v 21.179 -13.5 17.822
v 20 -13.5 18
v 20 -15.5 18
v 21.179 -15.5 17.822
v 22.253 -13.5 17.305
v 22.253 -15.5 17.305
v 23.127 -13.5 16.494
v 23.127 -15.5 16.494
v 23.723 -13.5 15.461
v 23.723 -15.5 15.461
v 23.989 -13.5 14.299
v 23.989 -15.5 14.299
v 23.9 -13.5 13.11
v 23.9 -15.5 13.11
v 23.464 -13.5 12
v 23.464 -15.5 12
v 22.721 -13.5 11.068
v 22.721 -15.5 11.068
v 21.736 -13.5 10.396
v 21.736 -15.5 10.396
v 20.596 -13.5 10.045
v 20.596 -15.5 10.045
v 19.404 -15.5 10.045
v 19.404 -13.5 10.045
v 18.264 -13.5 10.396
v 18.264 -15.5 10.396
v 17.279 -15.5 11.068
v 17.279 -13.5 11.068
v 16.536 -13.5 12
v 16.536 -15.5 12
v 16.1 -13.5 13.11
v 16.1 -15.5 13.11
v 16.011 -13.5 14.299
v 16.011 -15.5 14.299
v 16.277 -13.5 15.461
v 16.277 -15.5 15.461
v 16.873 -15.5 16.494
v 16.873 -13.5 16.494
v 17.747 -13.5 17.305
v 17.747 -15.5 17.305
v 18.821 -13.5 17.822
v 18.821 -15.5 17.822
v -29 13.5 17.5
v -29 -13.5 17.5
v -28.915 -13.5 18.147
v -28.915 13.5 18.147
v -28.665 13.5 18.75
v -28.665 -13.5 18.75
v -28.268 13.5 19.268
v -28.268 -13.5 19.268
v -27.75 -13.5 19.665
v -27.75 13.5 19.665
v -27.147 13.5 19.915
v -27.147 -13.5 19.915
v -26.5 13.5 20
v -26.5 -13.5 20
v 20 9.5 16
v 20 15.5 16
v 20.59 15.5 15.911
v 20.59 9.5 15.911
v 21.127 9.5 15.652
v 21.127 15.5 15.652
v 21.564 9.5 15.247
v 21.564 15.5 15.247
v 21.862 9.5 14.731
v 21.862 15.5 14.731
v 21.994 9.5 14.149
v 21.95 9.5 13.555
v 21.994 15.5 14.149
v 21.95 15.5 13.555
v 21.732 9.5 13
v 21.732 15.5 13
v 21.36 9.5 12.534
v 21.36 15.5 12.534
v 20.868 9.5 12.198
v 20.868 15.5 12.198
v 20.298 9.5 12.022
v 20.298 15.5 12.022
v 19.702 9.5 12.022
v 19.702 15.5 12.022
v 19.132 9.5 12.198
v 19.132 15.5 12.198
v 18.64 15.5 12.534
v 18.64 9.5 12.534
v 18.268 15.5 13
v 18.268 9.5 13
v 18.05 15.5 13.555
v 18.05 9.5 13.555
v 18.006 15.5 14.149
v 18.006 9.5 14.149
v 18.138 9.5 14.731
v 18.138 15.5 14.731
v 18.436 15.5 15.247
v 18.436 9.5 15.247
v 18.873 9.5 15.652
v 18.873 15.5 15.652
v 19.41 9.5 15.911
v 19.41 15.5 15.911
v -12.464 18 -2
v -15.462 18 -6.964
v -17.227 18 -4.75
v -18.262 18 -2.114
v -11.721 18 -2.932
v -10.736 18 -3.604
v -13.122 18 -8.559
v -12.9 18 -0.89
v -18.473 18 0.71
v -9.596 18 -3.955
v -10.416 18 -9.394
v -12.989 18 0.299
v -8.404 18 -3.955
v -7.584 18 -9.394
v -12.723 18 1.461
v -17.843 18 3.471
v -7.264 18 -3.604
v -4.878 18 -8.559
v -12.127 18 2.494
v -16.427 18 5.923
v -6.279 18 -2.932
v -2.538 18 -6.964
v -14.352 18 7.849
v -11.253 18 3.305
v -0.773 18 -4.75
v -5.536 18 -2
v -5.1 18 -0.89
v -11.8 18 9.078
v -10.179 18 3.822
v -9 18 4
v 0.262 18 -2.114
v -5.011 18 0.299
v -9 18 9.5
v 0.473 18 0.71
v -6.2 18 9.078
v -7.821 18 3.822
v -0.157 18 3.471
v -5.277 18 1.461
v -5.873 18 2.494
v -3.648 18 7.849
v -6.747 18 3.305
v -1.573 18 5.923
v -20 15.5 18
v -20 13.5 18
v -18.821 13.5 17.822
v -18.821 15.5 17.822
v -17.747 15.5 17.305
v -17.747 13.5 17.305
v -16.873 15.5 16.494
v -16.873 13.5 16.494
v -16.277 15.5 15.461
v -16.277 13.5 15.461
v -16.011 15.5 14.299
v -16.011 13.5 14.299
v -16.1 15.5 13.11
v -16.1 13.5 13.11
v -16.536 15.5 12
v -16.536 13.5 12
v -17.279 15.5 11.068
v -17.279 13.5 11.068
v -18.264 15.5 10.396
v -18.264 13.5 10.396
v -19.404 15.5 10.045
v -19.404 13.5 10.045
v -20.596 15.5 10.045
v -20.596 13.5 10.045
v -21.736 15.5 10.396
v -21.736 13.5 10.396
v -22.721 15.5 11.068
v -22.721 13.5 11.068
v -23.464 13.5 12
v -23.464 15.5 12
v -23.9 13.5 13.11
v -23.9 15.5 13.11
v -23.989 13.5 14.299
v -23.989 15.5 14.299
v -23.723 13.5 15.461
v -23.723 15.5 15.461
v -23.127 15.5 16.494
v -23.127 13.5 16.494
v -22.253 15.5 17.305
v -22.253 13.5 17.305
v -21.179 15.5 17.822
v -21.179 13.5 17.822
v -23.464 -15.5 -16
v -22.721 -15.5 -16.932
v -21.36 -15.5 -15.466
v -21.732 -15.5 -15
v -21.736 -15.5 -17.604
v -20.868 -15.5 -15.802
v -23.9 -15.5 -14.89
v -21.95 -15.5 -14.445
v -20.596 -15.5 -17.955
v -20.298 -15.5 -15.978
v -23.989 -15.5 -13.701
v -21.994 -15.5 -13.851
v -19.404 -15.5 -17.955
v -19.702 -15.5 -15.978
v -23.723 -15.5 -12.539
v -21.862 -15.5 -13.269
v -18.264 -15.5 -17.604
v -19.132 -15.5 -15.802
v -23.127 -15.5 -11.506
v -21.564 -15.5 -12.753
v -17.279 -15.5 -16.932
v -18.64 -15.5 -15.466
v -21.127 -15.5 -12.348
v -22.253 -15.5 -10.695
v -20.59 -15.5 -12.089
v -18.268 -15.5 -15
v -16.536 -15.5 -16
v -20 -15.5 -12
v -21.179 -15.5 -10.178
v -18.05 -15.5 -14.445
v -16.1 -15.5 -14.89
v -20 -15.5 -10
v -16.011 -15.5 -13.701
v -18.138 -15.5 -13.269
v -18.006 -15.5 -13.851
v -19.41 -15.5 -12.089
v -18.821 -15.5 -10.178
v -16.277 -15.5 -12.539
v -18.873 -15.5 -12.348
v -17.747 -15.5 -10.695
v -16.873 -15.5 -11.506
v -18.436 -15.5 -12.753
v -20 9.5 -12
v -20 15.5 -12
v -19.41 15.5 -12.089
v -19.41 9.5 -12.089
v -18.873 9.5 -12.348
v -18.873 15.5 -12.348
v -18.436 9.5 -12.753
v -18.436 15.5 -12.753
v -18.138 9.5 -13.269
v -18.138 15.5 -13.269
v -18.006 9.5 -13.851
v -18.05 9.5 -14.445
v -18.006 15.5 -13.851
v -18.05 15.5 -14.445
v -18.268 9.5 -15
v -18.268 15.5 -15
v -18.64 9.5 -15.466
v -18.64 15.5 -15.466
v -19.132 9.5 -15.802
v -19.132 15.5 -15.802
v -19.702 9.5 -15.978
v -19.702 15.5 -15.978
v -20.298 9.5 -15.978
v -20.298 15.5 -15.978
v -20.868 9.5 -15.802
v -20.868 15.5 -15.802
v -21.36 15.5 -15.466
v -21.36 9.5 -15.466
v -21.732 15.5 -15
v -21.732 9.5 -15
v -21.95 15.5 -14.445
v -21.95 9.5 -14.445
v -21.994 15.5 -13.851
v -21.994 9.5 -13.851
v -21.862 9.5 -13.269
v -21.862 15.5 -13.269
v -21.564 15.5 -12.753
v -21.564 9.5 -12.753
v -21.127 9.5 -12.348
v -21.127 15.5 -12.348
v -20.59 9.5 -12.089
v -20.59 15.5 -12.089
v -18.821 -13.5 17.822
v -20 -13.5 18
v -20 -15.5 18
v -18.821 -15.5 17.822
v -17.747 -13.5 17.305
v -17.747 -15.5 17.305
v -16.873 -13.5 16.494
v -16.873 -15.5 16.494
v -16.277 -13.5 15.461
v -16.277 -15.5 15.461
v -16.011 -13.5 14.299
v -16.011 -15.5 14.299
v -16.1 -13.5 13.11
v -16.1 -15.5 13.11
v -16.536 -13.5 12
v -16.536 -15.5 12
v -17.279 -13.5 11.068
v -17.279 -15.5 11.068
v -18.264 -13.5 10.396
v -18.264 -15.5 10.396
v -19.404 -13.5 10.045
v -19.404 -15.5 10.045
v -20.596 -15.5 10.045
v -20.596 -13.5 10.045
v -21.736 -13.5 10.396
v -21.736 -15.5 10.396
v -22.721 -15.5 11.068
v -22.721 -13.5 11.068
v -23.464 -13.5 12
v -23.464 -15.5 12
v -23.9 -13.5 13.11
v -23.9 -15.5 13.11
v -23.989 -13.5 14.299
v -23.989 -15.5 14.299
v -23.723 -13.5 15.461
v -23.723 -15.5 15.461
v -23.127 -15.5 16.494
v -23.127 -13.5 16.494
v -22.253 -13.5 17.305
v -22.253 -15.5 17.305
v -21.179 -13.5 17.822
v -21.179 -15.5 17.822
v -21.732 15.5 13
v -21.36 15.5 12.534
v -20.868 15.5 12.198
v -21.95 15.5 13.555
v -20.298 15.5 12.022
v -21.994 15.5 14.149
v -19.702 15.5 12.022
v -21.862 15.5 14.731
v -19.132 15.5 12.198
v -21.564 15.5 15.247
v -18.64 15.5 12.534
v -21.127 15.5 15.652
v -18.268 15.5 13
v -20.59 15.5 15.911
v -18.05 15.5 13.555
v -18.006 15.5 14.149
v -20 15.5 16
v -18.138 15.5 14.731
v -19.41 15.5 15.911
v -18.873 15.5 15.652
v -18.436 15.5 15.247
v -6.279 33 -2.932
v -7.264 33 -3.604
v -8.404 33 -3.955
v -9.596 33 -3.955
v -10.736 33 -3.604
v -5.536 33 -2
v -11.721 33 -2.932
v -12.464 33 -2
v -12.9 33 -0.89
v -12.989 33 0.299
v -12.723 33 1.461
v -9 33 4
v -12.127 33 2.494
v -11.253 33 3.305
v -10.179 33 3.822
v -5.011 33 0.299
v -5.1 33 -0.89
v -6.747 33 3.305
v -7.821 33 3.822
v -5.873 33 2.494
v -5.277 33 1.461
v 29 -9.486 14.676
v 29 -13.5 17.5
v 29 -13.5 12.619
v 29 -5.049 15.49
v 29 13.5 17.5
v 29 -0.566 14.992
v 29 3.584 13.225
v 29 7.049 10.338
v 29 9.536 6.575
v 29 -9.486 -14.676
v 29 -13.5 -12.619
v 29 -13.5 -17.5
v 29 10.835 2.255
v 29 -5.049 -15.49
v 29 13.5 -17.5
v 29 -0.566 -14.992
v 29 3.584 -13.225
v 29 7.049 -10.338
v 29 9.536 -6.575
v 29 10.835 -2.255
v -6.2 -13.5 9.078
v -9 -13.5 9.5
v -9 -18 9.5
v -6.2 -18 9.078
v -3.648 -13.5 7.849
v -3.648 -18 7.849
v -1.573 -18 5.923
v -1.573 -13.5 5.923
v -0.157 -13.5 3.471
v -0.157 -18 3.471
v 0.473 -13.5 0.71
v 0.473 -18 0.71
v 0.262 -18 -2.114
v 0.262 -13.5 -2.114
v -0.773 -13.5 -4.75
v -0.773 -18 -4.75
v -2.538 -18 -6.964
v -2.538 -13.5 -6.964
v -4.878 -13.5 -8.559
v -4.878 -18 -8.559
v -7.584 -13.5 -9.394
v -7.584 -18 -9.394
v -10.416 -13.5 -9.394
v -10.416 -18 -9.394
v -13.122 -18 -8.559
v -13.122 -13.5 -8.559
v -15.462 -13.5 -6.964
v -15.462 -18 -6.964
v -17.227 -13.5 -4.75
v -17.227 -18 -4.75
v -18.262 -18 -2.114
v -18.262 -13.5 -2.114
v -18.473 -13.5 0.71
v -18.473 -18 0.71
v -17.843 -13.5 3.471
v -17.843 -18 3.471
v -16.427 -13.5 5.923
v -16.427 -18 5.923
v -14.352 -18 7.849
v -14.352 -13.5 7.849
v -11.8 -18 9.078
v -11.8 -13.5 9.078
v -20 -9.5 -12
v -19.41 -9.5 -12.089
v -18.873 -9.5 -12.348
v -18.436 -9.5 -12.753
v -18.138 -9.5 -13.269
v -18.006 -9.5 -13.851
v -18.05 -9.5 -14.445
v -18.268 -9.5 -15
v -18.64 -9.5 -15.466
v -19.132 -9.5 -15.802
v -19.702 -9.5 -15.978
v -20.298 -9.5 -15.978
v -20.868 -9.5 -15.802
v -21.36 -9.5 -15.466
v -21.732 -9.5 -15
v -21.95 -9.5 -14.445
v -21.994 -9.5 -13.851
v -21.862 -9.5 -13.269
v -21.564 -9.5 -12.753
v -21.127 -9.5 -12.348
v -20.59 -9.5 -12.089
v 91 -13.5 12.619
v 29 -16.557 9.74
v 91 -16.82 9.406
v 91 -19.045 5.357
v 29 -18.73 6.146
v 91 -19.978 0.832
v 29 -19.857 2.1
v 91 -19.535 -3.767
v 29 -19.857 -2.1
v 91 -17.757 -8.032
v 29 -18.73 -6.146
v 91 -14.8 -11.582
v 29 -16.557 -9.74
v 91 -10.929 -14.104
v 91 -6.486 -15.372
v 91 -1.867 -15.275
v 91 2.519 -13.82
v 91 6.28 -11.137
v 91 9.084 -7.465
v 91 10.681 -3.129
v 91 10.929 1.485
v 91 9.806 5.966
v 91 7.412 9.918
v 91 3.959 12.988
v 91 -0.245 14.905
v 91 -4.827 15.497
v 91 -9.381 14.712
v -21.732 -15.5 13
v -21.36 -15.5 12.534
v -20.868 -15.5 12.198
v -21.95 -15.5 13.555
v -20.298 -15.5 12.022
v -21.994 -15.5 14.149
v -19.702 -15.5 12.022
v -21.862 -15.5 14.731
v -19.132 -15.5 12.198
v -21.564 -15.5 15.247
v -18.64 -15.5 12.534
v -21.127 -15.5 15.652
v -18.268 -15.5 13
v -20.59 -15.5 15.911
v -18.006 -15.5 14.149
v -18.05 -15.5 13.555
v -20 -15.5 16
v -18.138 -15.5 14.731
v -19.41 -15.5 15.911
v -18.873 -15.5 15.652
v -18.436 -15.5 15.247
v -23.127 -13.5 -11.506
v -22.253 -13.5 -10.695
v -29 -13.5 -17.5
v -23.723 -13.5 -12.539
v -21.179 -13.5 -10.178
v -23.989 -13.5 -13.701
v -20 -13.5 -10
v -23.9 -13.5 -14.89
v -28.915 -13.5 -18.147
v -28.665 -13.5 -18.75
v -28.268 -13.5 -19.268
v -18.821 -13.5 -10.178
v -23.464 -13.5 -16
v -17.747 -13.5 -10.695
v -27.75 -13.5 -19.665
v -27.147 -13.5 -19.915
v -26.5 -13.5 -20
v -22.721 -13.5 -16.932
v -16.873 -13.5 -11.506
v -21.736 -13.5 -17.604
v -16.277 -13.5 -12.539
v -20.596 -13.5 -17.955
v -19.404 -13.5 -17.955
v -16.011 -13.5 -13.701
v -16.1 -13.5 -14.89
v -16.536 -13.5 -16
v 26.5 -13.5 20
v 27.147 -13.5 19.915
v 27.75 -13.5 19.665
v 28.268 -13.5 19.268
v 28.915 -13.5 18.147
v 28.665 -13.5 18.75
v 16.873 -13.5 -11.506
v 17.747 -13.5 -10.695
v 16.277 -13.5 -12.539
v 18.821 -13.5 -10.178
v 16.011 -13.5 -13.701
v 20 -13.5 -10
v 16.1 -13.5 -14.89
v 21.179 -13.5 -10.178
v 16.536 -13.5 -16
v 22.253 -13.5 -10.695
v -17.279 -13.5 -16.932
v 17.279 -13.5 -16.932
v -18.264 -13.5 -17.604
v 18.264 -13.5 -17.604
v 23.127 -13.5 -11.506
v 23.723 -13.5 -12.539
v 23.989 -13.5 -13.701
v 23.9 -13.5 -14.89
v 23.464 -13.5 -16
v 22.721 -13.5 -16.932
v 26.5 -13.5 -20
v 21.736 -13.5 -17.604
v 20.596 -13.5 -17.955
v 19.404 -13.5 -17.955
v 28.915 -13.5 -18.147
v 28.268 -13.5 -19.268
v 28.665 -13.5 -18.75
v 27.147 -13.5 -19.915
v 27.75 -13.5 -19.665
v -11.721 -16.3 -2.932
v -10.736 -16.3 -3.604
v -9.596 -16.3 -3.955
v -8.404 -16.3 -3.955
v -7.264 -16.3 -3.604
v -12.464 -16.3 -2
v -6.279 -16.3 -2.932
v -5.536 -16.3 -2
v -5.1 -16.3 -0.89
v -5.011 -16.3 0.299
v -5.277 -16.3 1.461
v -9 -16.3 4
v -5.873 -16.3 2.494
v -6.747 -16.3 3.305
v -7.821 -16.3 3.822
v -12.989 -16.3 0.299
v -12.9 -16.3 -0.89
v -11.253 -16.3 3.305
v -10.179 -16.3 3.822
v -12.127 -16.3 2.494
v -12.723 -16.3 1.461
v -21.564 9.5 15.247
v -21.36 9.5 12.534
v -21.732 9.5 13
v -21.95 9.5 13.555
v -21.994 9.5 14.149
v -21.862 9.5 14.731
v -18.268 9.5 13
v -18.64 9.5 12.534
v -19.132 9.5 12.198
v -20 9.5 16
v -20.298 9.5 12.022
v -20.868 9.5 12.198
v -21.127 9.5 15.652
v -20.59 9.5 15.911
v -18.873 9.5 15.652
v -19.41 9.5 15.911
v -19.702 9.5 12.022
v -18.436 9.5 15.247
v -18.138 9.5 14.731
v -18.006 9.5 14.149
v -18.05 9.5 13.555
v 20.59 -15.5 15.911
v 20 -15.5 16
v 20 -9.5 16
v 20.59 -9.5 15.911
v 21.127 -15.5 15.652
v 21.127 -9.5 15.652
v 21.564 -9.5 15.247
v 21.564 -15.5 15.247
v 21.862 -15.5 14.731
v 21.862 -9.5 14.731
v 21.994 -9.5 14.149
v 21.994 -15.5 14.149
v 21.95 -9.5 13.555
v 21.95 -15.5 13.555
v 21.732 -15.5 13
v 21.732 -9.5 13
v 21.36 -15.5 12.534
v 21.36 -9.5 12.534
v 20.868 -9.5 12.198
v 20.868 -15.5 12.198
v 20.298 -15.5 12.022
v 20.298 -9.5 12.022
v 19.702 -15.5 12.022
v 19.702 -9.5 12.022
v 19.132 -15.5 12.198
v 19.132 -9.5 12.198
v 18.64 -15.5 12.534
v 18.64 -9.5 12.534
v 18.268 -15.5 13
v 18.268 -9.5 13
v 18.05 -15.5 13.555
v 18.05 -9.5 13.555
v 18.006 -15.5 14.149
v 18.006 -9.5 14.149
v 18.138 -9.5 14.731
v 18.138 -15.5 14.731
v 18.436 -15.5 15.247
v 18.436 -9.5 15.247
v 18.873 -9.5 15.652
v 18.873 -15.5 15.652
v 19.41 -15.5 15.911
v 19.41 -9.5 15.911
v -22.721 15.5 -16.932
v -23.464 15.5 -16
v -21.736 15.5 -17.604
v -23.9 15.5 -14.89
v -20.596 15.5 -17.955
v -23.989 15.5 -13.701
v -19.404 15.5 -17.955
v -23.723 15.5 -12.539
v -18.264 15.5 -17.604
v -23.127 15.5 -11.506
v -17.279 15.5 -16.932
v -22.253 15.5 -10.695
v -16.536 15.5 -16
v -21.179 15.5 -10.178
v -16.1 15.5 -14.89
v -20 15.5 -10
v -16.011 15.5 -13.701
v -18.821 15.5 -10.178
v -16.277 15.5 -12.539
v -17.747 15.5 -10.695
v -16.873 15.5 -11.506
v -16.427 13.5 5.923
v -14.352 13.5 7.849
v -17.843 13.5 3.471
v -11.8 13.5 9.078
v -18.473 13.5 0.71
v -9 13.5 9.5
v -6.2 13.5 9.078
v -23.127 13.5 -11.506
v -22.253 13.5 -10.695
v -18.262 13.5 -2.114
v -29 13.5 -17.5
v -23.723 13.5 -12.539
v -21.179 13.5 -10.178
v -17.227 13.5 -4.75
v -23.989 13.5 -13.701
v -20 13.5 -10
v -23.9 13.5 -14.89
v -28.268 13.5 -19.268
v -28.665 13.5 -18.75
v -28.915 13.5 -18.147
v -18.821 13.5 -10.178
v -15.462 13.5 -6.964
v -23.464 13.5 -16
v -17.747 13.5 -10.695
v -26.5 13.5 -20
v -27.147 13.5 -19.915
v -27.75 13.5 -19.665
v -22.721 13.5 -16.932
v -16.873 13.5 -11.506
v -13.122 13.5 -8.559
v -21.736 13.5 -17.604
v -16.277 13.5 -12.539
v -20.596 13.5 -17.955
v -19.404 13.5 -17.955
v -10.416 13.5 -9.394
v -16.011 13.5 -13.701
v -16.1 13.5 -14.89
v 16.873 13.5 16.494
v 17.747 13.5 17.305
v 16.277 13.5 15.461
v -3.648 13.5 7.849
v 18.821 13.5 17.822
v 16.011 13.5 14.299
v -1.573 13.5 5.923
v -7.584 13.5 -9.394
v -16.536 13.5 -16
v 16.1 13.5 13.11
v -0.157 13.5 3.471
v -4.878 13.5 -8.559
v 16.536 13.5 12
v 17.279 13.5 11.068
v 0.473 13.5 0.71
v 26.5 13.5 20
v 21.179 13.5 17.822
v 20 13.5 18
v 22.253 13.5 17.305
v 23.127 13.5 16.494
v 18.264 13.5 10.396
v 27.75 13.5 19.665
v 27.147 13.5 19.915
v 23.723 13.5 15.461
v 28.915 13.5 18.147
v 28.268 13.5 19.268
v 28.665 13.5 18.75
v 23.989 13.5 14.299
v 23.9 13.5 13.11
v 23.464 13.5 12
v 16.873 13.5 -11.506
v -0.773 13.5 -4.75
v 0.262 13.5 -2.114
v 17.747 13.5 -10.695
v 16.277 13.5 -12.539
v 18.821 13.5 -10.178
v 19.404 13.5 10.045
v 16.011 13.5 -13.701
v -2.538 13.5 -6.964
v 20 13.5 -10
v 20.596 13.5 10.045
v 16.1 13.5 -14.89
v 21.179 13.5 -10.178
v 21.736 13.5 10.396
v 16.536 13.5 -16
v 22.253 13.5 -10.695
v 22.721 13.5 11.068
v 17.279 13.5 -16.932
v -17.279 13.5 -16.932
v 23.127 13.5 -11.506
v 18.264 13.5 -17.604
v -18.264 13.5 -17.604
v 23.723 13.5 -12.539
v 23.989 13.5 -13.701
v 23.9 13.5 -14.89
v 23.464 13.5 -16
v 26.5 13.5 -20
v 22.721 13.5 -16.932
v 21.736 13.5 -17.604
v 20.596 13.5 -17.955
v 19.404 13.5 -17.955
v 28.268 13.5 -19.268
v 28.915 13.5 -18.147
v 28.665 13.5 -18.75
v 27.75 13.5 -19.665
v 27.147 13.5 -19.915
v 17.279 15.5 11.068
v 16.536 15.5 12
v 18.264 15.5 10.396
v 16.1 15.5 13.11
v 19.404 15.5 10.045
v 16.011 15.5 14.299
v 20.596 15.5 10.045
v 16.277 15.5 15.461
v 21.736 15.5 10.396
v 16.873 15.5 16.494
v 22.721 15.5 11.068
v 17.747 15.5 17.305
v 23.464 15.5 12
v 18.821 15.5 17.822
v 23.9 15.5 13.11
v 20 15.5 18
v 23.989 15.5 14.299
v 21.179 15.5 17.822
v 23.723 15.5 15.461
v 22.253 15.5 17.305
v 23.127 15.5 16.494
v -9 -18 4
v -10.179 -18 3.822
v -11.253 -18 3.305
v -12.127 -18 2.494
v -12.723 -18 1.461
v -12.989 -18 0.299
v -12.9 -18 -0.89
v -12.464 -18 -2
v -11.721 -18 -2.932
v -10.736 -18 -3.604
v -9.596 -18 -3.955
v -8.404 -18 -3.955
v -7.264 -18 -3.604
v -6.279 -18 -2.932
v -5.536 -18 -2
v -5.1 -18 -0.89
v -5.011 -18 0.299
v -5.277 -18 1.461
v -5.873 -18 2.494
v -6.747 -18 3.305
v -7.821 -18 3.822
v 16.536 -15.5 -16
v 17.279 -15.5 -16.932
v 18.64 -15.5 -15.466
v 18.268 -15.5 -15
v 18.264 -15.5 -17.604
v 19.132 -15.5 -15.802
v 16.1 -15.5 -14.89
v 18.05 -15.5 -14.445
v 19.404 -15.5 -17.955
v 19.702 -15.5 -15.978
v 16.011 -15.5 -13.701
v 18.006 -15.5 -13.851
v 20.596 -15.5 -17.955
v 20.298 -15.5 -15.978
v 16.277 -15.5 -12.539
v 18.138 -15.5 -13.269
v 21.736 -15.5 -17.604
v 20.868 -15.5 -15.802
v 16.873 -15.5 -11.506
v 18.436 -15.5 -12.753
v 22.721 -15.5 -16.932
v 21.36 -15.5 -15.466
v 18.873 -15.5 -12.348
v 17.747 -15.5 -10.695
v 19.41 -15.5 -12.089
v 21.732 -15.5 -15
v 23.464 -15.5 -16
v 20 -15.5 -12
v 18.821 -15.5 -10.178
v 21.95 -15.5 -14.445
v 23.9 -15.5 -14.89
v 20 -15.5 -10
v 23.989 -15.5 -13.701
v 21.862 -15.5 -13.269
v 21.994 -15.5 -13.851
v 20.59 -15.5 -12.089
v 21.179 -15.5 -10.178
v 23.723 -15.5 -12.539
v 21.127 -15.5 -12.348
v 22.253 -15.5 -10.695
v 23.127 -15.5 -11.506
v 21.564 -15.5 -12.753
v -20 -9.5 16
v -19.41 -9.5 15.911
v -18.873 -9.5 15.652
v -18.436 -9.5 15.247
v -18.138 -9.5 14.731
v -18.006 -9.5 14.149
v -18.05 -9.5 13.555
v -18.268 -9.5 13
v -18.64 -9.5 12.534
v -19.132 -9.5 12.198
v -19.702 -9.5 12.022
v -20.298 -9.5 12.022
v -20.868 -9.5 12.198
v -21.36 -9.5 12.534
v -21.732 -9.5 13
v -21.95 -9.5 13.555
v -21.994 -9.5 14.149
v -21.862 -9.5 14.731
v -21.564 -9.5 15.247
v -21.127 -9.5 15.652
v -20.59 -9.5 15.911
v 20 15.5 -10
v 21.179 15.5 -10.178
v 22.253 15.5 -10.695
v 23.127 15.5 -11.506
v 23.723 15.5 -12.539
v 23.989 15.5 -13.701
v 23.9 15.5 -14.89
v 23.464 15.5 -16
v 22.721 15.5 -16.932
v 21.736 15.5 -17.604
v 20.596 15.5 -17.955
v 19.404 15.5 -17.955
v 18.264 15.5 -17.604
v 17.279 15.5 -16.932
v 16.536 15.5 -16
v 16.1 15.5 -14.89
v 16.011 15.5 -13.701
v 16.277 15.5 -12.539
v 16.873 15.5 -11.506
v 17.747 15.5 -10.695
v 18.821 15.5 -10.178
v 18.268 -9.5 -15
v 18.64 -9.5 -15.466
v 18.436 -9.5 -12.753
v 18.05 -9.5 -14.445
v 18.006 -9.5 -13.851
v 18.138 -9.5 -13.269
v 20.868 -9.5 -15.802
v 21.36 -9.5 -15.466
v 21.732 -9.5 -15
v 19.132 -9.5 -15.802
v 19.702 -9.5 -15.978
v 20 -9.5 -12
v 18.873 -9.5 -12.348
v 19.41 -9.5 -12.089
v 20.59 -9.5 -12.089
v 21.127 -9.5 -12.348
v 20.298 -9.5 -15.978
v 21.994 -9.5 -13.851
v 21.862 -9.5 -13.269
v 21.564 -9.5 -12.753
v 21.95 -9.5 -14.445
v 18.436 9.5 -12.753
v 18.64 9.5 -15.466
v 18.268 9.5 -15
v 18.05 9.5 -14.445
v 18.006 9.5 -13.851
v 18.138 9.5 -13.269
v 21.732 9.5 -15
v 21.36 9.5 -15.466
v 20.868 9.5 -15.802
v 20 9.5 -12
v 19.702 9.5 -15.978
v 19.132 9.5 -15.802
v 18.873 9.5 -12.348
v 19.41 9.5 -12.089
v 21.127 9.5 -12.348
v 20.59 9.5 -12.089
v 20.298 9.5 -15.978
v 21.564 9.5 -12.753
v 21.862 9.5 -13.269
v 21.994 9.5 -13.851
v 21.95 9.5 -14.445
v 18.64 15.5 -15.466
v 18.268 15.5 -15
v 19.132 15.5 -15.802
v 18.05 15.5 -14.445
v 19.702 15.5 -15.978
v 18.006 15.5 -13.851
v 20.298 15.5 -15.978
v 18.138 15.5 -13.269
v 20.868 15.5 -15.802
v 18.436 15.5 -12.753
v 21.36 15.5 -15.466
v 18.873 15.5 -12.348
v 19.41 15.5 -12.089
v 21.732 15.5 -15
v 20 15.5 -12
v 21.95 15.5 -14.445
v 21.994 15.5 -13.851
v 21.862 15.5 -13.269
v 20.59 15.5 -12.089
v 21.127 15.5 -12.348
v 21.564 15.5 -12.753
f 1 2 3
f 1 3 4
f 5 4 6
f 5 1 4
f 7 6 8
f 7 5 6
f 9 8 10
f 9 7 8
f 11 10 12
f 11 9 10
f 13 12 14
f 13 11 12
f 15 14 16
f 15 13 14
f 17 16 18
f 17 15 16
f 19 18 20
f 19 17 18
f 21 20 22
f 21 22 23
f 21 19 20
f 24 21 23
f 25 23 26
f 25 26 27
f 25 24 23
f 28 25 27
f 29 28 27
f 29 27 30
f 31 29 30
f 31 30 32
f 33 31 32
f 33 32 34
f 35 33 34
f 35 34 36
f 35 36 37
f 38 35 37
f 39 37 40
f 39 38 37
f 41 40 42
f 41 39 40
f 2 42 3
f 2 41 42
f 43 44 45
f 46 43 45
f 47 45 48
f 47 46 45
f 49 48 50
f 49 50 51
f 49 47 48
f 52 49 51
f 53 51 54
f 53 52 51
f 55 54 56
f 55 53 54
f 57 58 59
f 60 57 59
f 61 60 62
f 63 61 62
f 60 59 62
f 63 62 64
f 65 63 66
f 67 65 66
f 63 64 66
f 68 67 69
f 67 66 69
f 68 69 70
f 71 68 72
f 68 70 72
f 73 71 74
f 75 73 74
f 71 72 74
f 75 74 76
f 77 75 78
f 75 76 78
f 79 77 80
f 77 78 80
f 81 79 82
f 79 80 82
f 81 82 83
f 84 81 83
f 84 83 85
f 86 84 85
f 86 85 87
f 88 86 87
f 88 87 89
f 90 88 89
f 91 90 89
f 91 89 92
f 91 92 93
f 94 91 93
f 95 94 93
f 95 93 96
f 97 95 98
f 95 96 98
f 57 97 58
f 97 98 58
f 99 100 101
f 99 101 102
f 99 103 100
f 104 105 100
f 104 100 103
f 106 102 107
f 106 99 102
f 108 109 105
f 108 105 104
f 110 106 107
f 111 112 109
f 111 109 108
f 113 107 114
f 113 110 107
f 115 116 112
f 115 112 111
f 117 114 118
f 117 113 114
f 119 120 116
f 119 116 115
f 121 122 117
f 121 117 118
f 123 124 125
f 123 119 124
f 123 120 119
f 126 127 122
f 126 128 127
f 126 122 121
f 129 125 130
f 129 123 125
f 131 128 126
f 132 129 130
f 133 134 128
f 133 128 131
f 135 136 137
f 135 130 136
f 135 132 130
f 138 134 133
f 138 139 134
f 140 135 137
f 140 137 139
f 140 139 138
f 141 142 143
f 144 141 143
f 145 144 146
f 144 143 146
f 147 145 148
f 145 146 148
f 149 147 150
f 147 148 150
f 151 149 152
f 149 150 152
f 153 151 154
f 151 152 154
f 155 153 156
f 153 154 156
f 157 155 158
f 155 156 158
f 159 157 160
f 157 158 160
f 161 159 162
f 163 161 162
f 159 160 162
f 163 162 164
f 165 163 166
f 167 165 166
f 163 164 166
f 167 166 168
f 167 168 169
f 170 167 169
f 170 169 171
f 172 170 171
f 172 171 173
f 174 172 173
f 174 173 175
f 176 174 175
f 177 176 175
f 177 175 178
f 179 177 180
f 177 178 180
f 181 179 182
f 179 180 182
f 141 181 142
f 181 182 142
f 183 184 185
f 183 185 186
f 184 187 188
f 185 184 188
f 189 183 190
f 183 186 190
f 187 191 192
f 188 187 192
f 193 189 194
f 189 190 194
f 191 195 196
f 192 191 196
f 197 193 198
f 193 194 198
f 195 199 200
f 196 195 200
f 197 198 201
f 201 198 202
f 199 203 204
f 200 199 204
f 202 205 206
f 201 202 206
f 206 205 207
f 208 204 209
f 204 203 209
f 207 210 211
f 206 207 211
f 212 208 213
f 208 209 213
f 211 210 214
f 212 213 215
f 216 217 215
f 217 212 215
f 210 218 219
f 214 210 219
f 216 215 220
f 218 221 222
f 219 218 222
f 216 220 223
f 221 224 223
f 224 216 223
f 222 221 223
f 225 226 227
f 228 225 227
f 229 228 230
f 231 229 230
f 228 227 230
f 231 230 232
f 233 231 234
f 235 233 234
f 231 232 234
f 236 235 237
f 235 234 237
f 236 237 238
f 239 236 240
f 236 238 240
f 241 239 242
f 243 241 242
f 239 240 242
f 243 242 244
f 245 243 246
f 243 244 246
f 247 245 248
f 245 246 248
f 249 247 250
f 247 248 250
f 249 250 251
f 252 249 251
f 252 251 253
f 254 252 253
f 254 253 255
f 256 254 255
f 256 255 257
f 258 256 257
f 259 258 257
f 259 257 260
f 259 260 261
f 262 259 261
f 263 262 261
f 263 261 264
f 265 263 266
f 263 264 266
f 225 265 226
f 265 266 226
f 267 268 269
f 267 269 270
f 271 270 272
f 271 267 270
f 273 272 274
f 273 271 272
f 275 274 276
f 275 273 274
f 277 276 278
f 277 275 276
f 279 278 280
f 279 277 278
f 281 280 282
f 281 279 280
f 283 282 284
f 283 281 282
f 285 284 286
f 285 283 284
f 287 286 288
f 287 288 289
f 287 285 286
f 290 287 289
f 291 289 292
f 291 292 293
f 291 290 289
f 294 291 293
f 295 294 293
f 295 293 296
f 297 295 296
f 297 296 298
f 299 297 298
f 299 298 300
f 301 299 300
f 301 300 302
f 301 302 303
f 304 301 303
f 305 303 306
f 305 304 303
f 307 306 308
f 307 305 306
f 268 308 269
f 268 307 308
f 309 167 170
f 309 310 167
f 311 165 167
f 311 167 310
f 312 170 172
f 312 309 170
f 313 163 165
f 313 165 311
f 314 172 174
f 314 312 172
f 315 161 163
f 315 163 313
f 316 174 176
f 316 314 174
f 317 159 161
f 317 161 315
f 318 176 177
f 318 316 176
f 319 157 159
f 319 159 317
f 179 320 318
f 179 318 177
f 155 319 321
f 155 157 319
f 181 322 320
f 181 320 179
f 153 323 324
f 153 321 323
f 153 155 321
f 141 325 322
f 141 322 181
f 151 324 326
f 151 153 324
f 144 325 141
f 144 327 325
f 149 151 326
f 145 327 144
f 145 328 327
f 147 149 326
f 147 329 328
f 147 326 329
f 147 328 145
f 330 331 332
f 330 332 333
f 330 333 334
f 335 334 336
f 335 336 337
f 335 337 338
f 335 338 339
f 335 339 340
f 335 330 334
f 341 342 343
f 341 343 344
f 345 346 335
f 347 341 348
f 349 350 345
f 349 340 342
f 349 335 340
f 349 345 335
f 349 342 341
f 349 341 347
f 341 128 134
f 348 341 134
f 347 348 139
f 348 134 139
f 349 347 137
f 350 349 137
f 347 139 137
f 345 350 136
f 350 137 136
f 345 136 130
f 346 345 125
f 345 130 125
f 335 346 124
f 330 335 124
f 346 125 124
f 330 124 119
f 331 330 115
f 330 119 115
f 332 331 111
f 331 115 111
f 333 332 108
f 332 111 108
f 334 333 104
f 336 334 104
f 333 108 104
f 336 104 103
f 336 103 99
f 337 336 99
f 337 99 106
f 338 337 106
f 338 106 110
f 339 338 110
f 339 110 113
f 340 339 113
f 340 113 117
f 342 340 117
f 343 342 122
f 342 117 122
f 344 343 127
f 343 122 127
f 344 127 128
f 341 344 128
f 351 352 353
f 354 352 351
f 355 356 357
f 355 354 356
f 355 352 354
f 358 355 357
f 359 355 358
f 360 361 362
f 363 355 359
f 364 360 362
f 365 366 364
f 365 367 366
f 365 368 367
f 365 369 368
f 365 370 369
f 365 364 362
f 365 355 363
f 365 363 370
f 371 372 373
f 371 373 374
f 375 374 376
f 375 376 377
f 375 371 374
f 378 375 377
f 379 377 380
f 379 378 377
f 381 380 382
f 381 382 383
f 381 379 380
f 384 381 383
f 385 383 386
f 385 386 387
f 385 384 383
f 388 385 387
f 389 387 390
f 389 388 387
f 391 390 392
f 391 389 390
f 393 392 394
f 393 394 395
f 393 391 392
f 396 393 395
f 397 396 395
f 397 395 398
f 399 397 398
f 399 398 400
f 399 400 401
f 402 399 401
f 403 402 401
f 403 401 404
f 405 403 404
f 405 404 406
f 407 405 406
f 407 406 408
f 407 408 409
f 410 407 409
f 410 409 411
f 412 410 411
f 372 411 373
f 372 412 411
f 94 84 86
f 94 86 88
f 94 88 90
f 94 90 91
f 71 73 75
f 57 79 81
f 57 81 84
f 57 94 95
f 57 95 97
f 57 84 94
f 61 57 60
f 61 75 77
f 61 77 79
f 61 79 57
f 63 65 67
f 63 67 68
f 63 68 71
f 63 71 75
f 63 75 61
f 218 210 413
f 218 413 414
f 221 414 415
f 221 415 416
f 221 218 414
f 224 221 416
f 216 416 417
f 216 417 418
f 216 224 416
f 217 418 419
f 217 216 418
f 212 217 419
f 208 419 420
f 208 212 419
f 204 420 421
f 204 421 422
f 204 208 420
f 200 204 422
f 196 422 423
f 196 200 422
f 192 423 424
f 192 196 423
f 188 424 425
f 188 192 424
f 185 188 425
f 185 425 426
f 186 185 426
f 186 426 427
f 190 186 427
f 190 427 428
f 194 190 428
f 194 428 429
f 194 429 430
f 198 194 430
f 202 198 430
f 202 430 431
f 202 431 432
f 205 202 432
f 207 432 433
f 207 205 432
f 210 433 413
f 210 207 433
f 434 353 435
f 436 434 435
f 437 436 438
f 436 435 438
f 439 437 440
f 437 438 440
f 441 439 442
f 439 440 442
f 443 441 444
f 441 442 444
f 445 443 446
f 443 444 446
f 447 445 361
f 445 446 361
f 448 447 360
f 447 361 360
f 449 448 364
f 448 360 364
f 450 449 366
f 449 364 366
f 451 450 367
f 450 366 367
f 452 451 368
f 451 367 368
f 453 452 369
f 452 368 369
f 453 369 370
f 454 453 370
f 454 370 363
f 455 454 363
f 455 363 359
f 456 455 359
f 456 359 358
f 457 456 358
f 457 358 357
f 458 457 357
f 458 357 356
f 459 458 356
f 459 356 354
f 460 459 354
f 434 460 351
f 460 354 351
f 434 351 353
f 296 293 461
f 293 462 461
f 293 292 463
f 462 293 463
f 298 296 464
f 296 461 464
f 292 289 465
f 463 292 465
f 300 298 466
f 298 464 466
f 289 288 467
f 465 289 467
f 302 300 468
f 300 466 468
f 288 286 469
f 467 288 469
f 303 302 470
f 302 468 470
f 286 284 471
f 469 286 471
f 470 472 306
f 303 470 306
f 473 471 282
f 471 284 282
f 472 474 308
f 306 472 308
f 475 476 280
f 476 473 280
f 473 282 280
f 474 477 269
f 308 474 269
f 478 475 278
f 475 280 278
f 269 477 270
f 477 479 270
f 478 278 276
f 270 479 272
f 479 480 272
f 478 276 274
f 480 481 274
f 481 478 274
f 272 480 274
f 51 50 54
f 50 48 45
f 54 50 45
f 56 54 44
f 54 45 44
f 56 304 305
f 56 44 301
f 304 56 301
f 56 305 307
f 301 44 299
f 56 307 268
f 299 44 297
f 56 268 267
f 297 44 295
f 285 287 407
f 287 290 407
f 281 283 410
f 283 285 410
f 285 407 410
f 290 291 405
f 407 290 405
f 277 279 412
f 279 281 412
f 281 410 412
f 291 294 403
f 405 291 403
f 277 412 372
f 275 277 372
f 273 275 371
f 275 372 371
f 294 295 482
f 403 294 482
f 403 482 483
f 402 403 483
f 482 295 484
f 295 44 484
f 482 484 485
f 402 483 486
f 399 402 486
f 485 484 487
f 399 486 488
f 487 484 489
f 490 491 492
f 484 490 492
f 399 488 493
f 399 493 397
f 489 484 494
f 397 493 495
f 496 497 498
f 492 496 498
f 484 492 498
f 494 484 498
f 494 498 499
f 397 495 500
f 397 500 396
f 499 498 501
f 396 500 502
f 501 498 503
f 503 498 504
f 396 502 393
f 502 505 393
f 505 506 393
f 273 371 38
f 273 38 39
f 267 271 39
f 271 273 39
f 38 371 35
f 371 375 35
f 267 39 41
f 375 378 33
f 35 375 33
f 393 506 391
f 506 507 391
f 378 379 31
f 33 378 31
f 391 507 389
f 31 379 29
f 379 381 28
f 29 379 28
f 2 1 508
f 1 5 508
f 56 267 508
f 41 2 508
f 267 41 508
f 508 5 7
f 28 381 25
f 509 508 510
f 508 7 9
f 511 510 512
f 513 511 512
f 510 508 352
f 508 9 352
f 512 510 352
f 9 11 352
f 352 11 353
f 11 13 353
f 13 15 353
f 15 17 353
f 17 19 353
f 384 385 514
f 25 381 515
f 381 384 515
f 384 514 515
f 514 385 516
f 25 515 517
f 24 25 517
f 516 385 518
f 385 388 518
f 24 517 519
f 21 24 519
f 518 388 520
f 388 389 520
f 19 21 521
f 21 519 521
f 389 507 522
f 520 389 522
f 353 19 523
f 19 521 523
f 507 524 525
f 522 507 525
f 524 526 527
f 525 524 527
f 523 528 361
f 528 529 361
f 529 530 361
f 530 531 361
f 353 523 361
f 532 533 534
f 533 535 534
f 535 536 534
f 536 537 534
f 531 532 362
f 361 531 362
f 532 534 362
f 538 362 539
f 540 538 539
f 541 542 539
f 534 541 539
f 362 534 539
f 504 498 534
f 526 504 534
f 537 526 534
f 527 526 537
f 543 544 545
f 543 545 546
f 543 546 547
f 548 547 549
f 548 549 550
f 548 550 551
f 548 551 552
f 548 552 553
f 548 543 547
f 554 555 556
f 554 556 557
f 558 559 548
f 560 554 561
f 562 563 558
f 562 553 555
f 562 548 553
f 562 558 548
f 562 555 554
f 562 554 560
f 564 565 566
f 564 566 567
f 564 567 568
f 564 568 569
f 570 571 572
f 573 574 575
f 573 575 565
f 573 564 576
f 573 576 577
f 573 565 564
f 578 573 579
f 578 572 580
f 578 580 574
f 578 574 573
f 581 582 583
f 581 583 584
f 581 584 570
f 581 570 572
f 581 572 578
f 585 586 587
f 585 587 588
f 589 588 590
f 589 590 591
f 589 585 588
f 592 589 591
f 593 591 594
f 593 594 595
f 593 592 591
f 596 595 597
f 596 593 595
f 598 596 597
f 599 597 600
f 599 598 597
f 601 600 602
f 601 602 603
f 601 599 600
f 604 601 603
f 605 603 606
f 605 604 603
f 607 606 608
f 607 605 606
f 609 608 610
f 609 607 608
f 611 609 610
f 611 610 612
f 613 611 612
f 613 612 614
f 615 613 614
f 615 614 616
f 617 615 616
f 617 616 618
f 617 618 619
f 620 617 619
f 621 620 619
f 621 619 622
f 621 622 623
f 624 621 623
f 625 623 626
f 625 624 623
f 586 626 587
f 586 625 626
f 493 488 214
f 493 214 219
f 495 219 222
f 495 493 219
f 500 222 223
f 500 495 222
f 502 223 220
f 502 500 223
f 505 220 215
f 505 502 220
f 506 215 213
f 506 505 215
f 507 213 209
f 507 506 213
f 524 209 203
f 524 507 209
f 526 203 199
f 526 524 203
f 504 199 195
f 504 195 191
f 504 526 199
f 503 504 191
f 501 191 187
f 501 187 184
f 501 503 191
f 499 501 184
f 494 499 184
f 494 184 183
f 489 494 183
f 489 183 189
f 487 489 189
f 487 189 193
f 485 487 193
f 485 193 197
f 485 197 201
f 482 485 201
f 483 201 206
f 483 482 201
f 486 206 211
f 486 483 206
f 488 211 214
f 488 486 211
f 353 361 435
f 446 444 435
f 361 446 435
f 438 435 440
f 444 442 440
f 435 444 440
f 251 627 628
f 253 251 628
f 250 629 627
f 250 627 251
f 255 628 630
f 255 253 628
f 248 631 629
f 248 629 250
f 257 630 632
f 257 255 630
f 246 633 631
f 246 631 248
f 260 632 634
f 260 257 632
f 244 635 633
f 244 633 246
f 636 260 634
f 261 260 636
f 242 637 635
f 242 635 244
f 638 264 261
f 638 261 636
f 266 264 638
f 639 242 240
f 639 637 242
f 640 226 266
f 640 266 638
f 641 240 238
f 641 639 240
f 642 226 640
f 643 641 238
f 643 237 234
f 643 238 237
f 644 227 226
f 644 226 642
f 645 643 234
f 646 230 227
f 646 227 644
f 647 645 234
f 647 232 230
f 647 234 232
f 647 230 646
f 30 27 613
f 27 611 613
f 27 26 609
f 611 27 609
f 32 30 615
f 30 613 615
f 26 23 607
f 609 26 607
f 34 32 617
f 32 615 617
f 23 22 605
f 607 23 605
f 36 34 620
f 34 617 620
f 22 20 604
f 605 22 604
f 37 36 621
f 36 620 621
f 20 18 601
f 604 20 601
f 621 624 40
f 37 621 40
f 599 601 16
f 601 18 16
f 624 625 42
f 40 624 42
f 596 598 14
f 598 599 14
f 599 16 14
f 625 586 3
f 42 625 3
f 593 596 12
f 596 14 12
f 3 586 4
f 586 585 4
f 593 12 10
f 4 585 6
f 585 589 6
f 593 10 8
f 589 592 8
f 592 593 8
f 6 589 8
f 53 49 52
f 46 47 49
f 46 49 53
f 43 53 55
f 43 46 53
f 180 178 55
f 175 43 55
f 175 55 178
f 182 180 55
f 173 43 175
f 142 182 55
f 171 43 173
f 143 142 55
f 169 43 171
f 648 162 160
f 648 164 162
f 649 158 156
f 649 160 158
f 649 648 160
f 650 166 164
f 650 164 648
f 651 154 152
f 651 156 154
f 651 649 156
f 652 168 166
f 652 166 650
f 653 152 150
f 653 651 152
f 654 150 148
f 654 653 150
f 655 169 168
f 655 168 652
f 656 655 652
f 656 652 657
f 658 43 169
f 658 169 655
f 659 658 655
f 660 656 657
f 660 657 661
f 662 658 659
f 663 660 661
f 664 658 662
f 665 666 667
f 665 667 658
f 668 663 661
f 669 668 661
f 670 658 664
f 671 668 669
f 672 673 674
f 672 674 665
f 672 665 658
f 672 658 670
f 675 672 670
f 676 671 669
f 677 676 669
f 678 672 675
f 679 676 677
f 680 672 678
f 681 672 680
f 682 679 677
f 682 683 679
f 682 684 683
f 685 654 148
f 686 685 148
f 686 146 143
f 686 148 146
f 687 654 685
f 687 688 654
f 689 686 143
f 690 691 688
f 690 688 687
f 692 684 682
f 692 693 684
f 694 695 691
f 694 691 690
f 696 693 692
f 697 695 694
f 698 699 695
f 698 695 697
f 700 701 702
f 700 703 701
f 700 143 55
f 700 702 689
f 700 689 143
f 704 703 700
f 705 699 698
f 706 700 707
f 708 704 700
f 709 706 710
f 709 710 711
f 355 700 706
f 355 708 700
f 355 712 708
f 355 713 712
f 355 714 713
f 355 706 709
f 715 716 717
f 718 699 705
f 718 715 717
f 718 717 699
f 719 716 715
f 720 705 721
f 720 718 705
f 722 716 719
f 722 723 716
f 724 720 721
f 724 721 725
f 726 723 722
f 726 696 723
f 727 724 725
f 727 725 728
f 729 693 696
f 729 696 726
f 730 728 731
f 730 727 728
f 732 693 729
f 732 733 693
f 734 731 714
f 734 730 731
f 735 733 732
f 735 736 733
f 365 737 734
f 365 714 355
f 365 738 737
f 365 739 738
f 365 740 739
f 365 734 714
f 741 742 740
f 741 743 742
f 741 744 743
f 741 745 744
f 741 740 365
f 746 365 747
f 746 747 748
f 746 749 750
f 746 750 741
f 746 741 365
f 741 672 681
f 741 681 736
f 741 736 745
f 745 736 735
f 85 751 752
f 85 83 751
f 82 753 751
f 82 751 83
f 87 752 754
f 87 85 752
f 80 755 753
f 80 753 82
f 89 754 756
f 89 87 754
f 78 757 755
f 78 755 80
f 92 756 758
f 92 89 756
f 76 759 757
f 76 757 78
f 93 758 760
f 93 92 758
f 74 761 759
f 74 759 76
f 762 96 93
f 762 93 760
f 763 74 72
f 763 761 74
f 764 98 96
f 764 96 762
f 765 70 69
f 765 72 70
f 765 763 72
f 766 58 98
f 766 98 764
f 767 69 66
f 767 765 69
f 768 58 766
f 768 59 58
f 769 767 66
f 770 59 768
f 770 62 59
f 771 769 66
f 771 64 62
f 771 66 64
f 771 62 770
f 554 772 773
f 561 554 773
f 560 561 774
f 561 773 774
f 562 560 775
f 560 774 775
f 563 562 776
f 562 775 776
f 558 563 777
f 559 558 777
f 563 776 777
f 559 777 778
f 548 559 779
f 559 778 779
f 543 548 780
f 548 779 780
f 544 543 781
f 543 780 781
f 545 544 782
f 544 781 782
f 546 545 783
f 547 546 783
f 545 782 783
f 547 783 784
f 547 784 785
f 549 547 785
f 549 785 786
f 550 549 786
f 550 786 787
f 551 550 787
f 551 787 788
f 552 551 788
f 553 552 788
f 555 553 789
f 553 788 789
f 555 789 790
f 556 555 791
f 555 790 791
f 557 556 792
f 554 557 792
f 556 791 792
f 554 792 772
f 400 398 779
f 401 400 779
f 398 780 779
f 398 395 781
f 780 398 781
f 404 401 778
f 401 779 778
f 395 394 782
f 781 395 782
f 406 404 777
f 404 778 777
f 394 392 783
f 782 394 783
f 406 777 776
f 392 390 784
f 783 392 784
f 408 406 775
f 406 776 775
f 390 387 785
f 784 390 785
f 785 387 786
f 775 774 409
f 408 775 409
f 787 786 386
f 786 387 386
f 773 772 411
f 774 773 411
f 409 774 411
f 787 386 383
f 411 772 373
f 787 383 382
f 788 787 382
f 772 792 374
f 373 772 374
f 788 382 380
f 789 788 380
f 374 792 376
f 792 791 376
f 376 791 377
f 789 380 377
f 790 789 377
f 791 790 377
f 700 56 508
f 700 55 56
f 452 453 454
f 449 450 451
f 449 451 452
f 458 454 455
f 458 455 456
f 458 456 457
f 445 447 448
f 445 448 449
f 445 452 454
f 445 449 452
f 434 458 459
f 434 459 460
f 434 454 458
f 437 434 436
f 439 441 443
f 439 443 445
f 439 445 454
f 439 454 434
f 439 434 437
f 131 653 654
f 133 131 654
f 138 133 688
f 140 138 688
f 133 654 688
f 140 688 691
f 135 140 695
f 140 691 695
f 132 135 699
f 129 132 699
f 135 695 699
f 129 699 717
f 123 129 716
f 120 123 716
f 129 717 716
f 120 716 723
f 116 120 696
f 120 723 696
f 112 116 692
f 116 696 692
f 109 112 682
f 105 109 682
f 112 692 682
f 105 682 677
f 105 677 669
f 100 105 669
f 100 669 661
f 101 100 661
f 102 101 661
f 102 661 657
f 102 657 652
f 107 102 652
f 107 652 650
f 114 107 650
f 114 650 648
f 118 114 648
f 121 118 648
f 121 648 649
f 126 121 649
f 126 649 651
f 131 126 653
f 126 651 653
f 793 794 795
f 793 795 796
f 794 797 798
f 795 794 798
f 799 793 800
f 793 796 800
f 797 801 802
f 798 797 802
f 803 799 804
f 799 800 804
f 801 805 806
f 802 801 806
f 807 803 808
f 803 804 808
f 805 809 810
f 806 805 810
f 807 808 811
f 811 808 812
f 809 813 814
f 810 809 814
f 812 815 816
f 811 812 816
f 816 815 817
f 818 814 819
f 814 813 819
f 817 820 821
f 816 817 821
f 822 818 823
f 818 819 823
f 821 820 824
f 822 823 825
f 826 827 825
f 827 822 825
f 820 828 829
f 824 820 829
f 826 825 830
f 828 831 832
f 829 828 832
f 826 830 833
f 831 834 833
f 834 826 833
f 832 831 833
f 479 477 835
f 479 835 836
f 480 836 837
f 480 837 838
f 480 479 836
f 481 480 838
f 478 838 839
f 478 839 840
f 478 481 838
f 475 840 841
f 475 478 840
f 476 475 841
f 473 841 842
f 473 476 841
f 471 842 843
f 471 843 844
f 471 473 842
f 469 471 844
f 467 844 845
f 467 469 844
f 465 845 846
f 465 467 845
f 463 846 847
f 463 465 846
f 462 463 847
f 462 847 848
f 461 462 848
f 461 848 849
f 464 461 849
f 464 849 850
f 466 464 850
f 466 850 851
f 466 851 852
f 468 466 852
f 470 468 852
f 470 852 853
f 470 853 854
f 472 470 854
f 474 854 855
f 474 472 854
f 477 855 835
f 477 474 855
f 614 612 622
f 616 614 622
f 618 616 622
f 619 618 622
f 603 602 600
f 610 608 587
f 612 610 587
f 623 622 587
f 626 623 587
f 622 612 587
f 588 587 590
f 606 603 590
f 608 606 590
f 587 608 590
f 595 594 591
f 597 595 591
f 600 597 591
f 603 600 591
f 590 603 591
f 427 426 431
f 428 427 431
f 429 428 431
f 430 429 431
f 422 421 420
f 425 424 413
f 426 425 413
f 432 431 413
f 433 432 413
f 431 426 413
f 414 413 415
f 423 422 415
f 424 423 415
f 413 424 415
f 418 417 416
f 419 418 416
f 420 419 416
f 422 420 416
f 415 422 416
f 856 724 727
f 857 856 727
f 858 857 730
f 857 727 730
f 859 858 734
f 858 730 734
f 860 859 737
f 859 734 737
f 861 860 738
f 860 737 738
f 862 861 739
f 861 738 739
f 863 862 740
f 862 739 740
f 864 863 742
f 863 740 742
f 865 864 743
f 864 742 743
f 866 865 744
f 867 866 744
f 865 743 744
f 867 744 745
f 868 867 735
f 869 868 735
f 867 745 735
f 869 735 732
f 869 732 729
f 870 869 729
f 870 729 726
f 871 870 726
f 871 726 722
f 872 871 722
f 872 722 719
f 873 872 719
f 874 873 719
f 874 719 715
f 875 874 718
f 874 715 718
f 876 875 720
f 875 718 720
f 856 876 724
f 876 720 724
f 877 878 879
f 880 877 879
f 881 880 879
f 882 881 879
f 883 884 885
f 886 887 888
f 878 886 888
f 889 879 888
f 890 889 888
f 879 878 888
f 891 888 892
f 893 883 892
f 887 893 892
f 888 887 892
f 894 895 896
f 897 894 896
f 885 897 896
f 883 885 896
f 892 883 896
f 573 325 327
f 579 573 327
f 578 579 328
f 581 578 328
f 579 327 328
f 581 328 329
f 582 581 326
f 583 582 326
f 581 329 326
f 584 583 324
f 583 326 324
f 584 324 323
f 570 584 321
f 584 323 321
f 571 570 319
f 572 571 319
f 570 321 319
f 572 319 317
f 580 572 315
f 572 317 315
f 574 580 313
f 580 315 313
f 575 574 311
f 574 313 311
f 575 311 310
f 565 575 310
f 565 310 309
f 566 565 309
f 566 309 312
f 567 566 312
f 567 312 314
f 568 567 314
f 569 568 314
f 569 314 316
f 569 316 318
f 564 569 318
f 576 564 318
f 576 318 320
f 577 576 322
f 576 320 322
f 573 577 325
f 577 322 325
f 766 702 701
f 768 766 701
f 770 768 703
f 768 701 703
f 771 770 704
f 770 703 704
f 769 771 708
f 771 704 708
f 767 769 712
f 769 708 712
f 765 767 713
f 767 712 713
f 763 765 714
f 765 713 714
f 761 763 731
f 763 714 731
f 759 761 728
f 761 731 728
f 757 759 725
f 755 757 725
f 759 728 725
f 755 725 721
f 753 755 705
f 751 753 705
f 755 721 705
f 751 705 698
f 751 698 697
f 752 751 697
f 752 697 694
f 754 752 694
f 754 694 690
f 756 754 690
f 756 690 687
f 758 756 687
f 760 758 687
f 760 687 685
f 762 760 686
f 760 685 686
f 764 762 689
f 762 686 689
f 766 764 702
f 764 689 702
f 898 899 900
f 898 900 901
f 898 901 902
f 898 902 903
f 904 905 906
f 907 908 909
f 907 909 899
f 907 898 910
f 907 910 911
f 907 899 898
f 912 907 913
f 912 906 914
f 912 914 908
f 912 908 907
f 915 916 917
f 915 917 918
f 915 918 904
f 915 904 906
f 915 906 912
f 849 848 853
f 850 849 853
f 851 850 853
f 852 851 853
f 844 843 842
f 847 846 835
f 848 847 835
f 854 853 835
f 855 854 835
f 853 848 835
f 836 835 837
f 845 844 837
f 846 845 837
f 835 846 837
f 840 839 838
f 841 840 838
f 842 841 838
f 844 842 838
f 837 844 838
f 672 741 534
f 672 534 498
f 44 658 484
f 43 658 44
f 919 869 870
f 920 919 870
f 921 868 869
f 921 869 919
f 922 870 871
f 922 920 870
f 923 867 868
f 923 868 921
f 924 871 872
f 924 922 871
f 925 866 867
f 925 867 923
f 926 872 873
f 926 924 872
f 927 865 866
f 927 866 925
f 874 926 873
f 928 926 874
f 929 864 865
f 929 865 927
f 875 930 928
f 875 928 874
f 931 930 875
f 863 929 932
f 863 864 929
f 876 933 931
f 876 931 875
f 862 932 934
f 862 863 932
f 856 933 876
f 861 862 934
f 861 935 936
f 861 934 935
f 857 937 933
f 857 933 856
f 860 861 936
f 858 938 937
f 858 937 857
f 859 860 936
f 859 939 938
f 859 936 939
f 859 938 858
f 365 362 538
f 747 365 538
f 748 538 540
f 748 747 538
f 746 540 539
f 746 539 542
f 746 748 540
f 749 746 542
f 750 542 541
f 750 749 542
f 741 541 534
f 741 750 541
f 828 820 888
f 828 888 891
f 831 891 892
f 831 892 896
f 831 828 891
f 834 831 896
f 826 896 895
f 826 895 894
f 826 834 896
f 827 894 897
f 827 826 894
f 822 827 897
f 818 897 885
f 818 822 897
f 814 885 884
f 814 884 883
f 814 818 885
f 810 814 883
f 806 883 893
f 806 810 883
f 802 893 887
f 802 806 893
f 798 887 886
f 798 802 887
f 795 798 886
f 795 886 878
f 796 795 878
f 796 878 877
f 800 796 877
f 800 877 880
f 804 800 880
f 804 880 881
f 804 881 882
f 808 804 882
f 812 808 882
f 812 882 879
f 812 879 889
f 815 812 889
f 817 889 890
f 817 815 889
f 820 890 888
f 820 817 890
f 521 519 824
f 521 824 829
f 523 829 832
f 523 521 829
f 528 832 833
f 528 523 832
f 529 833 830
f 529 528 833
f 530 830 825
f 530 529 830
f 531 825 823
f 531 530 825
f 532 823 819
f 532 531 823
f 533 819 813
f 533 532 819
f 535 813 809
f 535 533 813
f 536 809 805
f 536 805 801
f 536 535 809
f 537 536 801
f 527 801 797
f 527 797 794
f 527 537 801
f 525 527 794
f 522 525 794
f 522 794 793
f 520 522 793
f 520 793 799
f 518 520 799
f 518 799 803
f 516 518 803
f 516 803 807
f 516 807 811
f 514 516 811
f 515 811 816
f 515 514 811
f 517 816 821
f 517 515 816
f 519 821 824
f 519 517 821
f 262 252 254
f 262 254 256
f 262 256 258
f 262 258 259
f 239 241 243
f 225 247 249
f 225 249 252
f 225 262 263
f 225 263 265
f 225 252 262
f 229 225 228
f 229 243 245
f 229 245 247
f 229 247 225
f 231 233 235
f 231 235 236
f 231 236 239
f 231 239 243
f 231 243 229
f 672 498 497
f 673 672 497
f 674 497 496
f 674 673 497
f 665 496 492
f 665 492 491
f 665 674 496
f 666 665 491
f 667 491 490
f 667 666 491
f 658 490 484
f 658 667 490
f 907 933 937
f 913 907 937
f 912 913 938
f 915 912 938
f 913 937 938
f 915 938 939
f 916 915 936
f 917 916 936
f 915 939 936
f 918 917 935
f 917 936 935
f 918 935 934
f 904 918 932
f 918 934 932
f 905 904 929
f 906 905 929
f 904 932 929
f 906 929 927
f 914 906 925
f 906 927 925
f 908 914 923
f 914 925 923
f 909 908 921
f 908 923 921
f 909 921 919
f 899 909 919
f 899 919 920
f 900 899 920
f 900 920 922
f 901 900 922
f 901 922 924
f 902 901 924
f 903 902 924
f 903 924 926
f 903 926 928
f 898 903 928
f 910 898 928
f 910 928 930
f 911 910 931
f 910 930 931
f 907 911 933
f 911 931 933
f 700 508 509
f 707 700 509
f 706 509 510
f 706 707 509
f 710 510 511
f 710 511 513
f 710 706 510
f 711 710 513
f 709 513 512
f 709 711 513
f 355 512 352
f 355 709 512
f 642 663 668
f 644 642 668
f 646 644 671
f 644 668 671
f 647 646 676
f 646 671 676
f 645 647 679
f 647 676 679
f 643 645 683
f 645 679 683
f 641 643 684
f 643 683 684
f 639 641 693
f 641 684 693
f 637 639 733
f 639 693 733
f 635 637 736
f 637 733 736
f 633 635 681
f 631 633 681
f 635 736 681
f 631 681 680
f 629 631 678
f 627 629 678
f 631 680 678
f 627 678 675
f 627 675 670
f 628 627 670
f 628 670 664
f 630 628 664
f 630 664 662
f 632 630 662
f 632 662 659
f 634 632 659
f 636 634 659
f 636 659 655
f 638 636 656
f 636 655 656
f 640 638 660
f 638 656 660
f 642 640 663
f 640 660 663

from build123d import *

# Parameters (mm, degrees)
BOSS_EXTRUDE1_DEPTH = 13.5
SKETCH2_R           = 4
BOSS_EXTRUDE2_DEPTH = 2
SKETCH3_R           = 2
CUT_EXTRUDE1_DEPTH  = 6
SKETCH6_R           = 9.5
BOSS_EXTRUDE5_DEPTH = 4.5
SKETCH4_R           = 4
BOSS_EXTRUDE3_DEPTH = 15
SKETCH5_R           = 15.5
BOSS_EXTRUDE4_DEPTH = 62
SKETCH7_R           = 4
CUT_EXTRUDE2_DEPTH  = 1.7


with BuildPart() as part:
    # Sketch1 → Boss-Extrude1 (new, symmetric)
    with BuildSketch(Plane(origin=(0, 0, 0), x_dir=(1, 0, 0), z_dir=(0, 1, 0))):
        with BuildLine():
            Line((-26.5, -20), (26.5, -20))
            ThreePointArc((26.5, -20), (28.267766953, -19.267766953), (29, -17.5))
            Line((29, -17.5), (29, 17.5))
            ThreePointArc((29, 17.5), (28.267766953, 19.267766953), (26.5, 20))
            Line((26.5, 20), (-26.5, 20))
            ThreePointArc((-26.5, 20), (-28.267766953, 19.267766953), (-29, 17.5))
            Line((-29, 17.5), (-29, -17.5))
            ThreePointArc((-29, -17.5), (-28.267766953, -19.267766953), (-26.5, -20))
        make_face()
    extrude(amount=BOSS_EXTRUDE1_DEPTH, both=True)

    # Sketch2 → Boss-Extrude2 (add)
    with BuildSketch(Plane(origin=(0, 13.5, 0), x_dir=(1, 0, 0), z_dir=(0, 1, 0))):
        with Locations(Location((-20, 14, 0), (0, 0, 270))):
            Circle(SKETCH2_R)
        with Locations(Location((-20, -14, 0), (0, 0, 270))):
            Circle(SKETCH2_R)
        with Locations(Location((20, -14, 0), (0, 0, 270))):
            Circle(SKETCH2_R)
        with Locations(Location((20, 14, 0), (0, 0, 270))):
            Circle(SKETCH2_R)
    boss_extrude2 = extrude(amount=BOSS_EXTRUDE2_DEPTH)

    # Sketch3 → Cut-Extrude1 (cut)
    with BuildSketch(Plane(origin=(0, 15.5, 0), x_dir=(1, 0, 0), z_dir=(0, 1, 0))):
        with Locations(Location((-20, 14, 0), (0, 0, 270))):
            Circle(SKETCH3_R)
        with Locations(Location((20, 14, 0), (0, 0, 270))):
            Circle(SKETCH3_R)
        with Locations(Location((20, -14, 0), (0, 0, 270))):
            Circle(SKETCH3_R)
        with Locations(Location((-20, -14, 0), (0, 0, 270))):
            Circle(SKETCH3_R)
    cut_extrude1 = extrude(amount=-CUT_EXTRUDE1_DEPTH, mode=Mode.SUBTRACT)

    # Sketch6 → Boss-Extrude5 (add)
    with BuildSketch(Plane(origin=(0, 13.5, 0), x_dir=(1, 0, 0), z_dir=(0, 1, 0))):
        with Locations(Location((-9, 0, 0), (0, 0, 270))):
            Circle(SKETCH6_R)
    boss_extrude5 = extrude(amount=BOSS_EXTRUDE5_DEPTH)

    # Sketch4 → Boss-Extrude3 (add)
    with BuildSketch(Plane(origin=(0, 18, 0), x_dir=(1, 0, 0), z_dir=(0, 1, 0))):
        with Locations(Location((-9, 0, 0), (0, 0, 270))):
            Circle(SKETCH4_R)
    extrude(amount=BOSS_EXTRUDE3_DEPTH)

    # Sketch5 → Boss-Extrude4 (add)
    with BuildSketch(Plane(origin=(29, 0, 0), x_dir=(0, 0, -1), z_dir=(1, 0, 0))):
        with Locations(Location((0, -4.5, 0), (0, 0, 215.49593265))):
            Circle(SKETCH5_R)
    extrude(amount=BOSS_EXTRUDE4_DEPTH)

    # Mirror2: Boss-Extrude2, Cut-Extrude1, Boss-Extrude5 across plane
    add(boss_extrude2.mirror(Plane.ZX))
    add(cut_extrude1.mirror(Plane.ZX), mode=Mode.SUBTRACT)
    add(boss_extrude5.mirror(Plane.ZX))

    # Sketch7 → Cut-Extrude2 (cut)
    with BuildSketch(Plane.XZ.offset(18)):
        with Locations(Location((-9, 0, 0), (0, 0, 90))):
            Circle(SKETCH7_R)
    extrude(amount=-CUT_EXTRUDE2_DEPTH, mode=Mode.SUBTRACT)


solid = part.part
